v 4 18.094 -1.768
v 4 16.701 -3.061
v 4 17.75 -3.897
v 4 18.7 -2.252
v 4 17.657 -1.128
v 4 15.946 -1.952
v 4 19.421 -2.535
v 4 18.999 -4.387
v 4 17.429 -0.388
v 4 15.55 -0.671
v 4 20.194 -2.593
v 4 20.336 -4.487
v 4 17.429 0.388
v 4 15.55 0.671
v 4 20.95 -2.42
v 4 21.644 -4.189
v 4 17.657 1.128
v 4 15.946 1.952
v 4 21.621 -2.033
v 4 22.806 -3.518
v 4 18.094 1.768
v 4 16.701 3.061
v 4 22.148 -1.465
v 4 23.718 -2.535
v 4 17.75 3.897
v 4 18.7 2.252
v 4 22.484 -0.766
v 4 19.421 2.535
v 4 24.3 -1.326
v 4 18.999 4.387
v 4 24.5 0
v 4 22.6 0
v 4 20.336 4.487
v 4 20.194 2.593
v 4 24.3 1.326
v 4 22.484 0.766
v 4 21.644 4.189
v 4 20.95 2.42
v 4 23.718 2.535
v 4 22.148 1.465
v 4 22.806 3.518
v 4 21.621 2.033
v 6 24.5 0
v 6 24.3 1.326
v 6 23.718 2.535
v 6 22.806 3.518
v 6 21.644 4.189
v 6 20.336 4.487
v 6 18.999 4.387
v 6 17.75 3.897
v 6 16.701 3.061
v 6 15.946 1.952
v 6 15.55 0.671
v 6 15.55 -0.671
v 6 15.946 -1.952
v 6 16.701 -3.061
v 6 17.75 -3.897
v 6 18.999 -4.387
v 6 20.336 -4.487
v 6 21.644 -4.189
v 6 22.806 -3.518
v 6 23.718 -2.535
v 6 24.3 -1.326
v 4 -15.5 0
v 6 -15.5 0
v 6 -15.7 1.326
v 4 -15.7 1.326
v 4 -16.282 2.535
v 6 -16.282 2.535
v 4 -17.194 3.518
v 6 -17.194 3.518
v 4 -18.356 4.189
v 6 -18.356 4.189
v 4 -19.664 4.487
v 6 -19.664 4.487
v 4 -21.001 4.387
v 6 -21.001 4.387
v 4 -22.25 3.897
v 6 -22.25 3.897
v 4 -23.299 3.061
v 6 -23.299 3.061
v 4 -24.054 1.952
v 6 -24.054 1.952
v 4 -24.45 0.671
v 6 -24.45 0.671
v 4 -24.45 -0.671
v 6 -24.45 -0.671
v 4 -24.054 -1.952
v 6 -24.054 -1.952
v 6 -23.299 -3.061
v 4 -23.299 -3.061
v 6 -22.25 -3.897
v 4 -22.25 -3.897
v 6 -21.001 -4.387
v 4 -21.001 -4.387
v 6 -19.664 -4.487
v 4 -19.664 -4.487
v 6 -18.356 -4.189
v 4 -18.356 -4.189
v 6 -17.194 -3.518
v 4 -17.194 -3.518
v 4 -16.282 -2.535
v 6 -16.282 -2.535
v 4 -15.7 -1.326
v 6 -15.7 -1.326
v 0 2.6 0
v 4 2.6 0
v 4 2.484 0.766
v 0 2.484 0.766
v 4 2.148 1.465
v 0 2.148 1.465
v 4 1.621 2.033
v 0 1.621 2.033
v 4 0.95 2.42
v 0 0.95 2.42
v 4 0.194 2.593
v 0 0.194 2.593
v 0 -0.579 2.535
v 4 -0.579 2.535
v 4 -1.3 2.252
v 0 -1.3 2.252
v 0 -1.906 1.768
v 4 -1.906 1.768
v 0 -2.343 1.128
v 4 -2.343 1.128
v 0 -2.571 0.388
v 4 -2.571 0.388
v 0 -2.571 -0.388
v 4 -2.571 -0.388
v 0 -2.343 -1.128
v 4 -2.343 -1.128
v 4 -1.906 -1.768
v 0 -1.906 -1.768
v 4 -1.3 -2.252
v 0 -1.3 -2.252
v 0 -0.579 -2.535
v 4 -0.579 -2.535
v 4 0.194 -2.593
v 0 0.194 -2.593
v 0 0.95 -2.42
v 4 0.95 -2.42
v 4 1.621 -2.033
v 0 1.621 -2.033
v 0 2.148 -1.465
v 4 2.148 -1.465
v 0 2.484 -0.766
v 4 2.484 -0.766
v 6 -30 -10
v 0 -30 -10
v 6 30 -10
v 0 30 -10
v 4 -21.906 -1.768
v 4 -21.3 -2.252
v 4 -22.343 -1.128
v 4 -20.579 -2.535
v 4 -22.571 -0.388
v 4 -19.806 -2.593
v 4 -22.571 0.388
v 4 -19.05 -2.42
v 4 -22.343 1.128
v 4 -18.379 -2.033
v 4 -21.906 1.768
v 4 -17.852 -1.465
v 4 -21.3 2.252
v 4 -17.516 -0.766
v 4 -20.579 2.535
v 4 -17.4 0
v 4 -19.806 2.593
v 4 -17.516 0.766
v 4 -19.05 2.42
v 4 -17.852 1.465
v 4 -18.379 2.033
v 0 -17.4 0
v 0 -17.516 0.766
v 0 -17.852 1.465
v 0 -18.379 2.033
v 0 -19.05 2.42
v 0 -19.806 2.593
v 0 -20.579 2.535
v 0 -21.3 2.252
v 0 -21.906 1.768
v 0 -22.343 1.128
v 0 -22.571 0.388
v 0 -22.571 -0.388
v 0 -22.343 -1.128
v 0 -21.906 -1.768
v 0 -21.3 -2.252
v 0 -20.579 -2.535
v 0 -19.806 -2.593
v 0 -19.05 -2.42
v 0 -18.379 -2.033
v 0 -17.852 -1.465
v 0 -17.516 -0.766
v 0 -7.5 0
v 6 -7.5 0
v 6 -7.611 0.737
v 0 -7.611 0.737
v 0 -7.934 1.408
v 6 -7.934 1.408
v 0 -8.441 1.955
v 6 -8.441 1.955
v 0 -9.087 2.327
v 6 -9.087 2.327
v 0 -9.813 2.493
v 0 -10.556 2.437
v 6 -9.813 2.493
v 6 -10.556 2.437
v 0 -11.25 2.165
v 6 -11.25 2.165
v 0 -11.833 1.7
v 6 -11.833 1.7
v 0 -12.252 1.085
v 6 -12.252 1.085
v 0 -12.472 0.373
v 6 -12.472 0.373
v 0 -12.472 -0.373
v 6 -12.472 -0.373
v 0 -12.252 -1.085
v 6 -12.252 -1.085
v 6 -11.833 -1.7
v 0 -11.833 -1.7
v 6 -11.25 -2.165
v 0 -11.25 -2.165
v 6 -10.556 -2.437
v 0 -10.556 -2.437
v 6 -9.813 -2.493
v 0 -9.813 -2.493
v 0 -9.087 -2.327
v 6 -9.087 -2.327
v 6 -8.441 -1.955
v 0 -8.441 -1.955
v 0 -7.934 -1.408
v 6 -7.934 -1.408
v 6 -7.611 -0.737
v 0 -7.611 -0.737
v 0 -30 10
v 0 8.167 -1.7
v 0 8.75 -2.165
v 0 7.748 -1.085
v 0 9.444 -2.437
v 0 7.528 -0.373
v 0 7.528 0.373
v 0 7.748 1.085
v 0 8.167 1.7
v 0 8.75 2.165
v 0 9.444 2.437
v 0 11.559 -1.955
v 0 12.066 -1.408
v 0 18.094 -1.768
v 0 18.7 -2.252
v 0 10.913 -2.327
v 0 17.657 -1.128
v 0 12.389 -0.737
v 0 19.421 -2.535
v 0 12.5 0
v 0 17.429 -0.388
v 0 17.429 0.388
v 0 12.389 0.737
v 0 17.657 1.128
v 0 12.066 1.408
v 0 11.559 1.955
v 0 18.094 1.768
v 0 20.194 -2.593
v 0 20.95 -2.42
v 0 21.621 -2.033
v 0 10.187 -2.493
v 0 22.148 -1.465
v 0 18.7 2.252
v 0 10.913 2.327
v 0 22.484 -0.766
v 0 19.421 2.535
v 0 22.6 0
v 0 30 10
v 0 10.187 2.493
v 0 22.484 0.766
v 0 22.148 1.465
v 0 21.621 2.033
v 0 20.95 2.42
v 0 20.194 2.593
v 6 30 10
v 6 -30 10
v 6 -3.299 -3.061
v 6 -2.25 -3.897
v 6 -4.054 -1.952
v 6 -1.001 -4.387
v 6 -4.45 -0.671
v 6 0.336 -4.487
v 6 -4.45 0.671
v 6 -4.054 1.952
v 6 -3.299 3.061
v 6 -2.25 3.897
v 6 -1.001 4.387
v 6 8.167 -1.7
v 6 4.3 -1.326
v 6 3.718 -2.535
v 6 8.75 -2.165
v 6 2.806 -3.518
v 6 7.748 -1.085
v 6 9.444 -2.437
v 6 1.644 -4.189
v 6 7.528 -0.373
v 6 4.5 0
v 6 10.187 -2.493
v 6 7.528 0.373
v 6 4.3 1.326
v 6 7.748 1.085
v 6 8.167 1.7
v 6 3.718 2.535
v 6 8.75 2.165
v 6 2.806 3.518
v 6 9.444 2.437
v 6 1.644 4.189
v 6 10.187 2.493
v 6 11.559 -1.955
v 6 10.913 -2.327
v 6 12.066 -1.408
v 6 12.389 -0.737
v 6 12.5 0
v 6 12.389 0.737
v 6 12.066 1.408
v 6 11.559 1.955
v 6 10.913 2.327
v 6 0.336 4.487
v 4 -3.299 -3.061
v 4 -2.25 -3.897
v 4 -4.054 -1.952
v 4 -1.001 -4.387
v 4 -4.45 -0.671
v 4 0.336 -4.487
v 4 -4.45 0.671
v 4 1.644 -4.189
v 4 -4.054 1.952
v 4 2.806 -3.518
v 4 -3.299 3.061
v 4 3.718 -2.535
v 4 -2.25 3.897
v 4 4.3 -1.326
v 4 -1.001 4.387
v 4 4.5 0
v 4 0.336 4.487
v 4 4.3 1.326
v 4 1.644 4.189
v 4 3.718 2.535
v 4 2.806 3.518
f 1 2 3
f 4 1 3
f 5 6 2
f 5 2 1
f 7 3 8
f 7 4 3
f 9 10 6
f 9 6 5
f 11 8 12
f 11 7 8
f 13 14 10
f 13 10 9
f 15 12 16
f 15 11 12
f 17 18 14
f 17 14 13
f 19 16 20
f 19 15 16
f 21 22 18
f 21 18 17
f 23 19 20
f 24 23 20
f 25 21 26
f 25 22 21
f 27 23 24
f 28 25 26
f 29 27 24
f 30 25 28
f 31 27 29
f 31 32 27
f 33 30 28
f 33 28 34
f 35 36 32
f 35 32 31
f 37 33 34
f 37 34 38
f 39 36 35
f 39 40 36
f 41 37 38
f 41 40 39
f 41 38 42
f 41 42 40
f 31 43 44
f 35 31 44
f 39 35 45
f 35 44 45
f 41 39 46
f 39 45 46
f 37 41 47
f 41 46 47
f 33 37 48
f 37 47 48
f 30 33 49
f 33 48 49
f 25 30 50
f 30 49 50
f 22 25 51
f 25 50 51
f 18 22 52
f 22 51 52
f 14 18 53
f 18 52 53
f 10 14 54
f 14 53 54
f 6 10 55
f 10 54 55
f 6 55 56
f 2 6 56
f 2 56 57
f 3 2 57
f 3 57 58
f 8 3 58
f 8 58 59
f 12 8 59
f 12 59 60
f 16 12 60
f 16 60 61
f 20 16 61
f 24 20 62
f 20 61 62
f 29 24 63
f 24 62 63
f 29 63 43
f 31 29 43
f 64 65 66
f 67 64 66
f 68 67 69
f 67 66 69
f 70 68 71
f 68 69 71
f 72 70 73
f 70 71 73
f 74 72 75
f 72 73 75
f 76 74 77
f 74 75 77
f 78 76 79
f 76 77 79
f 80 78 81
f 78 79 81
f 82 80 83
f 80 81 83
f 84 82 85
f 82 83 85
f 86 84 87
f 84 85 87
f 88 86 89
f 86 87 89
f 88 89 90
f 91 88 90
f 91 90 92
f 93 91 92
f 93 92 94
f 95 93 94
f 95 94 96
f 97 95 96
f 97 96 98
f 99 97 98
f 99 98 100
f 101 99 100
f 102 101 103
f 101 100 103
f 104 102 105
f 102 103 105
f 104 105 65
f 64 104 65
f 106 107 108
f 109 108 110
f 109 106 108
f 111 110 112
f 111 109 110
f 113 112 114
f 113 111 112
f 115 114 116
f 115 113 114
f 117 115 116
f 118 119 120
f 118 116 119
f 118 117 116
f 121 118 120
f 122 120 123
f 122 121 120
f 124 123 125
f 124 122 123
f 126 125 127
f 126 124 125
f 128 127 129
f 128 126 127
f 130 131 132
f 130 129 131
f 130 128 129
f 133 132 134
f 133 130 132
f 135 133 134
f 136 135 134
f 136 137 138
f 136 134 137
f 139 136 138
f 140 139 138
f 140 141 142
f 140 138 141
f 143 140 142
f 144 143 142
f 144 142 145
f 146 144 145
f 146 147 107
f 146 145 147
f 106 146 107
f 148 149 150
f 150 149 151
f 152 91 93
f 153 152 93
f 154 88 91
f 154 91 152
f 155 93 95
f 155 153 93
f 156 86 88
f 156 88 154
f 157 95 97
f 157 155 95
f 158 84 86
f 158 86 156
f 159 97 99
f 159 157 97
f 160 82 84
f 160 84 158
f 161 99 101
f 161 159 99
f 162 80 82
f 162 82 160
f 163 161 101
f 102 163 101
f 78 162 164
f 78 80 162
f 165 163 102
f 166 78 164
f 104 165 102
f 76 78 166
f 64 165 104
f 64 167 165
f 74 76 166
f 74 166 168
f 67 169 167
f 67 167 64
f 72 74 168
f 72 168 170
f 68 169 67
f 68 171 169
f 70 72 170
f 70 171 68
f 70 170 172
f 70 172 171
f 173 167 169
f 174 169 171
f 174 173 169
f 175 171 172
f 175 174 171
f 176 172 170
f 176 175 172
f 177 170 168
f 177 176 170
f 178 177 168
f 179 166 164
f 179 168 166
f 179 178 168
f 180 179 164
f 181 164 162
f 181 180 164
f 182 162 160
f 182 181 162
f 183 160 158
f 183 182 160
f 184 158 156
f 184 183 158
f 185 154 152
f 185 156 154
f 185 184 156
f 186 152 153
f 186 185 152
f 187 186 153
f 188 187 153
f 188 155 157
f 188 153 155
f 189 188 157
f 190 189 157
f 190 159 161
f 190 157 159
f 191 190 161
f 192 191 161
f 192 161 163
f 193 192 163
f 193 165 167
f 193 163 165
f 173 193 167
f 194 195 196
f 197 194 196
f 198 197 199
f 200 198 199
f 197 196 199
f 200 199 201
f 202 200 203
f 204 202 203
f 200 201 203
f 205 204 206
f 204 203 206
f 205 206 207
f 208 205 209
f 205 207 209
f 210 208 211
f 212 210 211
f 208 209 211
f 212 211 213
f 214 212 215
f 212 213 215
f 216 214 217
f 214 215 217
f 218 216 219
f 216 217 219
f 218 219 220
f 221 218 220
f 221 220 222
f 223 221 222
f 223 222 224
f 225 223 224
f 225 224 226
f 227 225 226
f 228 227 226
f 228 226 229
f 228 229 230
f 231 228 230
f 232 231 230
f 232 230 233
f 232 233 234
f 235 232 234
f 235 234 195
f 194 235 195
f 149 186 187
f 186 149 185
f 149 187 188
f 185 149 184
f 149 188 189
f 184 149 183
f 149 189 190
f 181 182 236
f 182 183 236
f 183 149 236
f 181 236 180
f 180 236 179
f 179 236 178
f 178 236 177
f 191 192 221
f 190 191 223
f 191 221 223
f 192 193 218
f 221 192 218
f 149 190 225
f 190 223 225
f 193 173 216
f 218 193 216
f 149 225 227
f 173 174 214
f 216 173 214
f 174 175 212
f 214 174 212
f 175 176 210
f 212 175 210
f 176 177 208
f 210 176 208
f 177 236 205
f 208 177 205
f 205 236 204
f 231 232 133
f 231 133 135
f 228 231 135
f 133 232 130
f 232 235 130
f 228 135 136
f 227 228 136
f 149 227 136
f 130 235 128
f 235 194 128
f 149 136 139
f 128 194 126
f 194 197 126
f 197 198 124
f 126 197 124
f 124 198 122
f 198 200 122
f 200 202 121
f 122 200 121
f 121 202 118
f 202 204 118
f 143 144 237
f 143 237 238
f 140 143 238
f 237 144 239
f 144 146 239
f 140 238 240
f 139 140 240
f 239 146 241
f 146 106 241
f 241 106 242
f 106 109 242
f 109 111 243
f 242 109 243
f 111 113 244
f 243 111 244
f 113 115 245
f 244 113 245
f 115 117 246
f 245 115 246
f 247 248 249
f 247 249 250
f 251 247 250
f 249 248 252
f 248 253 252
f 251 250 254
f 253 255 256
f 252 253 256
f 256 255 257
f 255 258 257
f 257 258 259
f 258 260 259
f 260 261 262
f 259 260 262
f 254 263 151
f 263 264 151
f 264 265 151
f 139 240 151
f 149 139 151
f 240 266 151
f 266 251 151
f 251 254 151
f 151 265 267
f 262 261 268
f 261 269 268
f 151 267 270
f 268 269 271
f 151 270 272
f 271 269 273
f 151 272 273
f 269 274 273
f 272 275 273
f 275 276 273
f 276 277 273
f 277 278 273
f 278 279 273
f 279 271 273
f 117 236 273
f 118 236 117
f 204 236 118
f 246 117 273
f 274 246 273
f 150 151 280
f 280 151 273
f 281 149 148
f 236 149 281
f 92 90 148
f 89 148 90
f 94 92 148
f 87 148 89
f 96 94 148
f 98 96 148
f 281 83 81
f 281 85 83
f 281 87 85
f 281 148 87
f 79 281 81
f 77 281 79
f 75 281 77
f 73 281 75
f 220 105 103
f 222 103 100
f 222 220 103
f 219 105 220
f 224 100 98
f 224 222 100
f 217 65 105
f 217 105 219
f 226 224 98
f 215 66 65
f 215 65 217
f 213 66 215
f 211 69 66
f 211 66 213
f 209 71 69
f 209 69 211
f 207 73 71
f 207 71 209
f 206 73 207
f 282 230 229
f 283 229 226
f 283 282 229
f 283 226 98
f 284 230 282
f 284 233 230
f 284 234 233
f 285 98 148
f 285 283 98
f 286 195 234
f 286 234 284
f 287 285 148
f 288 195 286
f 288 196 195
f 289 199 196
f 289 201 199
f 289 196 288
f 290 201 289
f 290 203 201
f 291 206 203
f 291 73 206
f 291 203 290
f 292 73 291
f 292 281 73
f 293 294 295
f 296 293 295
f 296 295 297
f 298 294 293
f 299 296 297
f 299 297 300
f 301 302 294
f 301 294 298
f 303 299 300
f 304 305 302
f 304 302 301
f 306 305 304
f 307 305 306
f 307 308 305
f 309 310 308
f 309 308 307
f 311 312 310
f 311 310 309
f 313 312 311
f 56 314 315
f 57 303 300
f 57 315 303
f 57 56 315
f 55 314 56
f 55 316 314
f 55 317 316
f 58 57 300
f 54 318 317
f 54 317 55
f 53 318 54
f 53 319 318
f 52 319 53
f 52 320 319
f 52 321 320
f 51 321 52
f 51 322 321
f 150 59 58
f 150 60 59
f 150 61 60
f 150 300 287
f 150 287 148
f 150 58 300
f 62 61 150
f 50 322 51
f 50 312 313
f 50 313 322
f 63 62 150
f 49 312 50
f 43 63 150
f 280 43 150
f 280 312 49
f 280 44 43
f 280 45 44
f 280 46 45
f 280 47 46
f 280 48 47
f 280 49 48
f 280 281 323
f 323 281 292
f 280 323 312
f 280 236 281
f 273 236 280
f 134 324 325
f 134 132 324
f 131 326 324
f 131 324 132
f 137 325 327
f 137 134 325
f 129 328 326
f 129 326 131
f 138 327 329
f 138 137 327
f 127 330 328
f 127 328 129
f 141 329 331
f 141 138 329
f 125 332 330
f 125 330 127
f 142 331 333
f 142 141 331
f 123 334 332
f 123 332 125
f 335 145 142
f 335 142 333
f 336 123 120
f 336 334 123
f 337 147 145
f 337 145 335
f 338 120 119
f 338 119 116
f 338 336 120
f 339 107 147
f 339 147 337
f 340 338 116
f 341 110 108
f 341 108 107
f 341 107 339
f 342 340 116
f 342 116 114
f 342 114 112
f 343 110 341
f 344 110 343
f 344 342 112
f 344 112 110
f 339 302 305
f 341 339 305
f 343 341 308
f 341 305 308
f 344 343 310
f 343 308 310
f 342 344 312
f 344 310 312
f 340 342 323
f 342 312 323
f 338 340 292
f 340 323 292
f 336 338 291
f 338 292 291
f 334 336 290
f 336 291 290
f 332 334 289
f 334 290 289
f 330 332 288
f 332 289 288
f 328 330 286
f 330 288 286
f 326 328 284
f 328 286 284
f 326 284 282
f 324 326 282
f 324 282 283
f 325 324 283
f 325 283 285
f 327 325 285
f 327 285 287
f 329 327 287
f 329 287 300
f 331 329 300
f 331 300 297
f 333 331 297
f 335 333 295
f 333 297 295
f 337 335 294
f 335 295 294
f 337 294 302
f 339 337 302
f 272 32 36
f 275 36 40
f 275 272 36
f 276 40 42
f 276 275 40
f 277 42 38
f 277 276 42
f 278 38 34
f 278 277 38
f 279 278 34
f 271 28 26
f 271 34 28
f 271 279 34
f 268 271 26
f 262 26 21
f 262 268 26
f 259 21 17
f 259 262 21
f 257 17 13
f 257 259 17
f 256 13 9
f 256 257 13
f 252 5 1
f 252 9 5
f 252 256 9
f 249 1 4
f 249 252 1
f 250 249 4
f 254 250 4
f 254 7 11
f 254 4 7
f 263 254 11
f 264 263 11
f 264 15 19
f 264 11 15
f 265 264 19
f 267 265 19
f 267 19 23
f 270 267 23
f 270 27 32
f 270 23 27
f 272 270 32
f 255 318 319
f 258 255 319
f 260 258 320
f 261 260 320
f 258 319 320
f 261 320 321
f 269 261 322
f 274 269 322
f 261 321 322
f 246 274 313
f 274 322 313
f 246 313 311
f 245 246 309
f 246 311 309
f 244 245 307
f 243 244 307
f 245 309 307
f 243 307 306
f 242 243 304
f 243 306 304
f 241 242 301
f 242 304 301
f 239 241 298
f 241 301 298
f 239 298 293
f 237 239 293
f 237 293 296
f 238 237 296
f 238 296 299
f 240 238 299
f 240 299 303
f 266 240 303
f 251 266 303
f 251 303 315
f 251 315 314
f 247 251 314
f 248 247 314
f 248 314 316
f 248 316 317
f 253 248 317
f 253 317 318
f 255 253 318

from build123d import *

# Parameters (mm, degrees)
F0_W     = 60
F0_H     = 20
F0_R     = 2.6
F1_DEPTH = 6
F2_R     = 4.5
F3_DEPTH = 2
F4_R     = 2.5
F5_DEPTH = 25


with BuildPart() as f1:
    # F0 (on Right) → F1 (new body)
    with BuildSketch(Plane.YZ):
        Rectangle(F0_W, F0_H)
        with Locations((-20, 0)):
            Circle(F0_R, mode=Mode.SUBTRACT)
        Circle(F0_R, mode=Mode.SUBTRACT)
        with Locations((20, 0)):
            Circle(F0_R, mode=Mode.SUBTRACT)
    extrude(amount=F1_DEPTH)

    # F2 (on face) → F3 (cut)
    with BuildSketch(Plane.YZ.offset(6)):
        with Locations((-20, 0)):
            Circle(F2_R)
        Circle(F2_R)
        with Locations((20, 0)):
            Circle(F2_R)
    extrude(amount=-F3_DEPTH, mode=Mode.SUBTRACT)

    # F4 (on face) → F5 (cut)
    with BuildSketch(Plane.YZ.offset(6)):
        with Locations((-10, 0)):
            Circle(F4_R)
        with Locations((10, 0)):
            Circle(F4_R)
    extrude(amount=-F5_DEPTH, mode=Mode.SUBTRACT)


solid = f1.part
